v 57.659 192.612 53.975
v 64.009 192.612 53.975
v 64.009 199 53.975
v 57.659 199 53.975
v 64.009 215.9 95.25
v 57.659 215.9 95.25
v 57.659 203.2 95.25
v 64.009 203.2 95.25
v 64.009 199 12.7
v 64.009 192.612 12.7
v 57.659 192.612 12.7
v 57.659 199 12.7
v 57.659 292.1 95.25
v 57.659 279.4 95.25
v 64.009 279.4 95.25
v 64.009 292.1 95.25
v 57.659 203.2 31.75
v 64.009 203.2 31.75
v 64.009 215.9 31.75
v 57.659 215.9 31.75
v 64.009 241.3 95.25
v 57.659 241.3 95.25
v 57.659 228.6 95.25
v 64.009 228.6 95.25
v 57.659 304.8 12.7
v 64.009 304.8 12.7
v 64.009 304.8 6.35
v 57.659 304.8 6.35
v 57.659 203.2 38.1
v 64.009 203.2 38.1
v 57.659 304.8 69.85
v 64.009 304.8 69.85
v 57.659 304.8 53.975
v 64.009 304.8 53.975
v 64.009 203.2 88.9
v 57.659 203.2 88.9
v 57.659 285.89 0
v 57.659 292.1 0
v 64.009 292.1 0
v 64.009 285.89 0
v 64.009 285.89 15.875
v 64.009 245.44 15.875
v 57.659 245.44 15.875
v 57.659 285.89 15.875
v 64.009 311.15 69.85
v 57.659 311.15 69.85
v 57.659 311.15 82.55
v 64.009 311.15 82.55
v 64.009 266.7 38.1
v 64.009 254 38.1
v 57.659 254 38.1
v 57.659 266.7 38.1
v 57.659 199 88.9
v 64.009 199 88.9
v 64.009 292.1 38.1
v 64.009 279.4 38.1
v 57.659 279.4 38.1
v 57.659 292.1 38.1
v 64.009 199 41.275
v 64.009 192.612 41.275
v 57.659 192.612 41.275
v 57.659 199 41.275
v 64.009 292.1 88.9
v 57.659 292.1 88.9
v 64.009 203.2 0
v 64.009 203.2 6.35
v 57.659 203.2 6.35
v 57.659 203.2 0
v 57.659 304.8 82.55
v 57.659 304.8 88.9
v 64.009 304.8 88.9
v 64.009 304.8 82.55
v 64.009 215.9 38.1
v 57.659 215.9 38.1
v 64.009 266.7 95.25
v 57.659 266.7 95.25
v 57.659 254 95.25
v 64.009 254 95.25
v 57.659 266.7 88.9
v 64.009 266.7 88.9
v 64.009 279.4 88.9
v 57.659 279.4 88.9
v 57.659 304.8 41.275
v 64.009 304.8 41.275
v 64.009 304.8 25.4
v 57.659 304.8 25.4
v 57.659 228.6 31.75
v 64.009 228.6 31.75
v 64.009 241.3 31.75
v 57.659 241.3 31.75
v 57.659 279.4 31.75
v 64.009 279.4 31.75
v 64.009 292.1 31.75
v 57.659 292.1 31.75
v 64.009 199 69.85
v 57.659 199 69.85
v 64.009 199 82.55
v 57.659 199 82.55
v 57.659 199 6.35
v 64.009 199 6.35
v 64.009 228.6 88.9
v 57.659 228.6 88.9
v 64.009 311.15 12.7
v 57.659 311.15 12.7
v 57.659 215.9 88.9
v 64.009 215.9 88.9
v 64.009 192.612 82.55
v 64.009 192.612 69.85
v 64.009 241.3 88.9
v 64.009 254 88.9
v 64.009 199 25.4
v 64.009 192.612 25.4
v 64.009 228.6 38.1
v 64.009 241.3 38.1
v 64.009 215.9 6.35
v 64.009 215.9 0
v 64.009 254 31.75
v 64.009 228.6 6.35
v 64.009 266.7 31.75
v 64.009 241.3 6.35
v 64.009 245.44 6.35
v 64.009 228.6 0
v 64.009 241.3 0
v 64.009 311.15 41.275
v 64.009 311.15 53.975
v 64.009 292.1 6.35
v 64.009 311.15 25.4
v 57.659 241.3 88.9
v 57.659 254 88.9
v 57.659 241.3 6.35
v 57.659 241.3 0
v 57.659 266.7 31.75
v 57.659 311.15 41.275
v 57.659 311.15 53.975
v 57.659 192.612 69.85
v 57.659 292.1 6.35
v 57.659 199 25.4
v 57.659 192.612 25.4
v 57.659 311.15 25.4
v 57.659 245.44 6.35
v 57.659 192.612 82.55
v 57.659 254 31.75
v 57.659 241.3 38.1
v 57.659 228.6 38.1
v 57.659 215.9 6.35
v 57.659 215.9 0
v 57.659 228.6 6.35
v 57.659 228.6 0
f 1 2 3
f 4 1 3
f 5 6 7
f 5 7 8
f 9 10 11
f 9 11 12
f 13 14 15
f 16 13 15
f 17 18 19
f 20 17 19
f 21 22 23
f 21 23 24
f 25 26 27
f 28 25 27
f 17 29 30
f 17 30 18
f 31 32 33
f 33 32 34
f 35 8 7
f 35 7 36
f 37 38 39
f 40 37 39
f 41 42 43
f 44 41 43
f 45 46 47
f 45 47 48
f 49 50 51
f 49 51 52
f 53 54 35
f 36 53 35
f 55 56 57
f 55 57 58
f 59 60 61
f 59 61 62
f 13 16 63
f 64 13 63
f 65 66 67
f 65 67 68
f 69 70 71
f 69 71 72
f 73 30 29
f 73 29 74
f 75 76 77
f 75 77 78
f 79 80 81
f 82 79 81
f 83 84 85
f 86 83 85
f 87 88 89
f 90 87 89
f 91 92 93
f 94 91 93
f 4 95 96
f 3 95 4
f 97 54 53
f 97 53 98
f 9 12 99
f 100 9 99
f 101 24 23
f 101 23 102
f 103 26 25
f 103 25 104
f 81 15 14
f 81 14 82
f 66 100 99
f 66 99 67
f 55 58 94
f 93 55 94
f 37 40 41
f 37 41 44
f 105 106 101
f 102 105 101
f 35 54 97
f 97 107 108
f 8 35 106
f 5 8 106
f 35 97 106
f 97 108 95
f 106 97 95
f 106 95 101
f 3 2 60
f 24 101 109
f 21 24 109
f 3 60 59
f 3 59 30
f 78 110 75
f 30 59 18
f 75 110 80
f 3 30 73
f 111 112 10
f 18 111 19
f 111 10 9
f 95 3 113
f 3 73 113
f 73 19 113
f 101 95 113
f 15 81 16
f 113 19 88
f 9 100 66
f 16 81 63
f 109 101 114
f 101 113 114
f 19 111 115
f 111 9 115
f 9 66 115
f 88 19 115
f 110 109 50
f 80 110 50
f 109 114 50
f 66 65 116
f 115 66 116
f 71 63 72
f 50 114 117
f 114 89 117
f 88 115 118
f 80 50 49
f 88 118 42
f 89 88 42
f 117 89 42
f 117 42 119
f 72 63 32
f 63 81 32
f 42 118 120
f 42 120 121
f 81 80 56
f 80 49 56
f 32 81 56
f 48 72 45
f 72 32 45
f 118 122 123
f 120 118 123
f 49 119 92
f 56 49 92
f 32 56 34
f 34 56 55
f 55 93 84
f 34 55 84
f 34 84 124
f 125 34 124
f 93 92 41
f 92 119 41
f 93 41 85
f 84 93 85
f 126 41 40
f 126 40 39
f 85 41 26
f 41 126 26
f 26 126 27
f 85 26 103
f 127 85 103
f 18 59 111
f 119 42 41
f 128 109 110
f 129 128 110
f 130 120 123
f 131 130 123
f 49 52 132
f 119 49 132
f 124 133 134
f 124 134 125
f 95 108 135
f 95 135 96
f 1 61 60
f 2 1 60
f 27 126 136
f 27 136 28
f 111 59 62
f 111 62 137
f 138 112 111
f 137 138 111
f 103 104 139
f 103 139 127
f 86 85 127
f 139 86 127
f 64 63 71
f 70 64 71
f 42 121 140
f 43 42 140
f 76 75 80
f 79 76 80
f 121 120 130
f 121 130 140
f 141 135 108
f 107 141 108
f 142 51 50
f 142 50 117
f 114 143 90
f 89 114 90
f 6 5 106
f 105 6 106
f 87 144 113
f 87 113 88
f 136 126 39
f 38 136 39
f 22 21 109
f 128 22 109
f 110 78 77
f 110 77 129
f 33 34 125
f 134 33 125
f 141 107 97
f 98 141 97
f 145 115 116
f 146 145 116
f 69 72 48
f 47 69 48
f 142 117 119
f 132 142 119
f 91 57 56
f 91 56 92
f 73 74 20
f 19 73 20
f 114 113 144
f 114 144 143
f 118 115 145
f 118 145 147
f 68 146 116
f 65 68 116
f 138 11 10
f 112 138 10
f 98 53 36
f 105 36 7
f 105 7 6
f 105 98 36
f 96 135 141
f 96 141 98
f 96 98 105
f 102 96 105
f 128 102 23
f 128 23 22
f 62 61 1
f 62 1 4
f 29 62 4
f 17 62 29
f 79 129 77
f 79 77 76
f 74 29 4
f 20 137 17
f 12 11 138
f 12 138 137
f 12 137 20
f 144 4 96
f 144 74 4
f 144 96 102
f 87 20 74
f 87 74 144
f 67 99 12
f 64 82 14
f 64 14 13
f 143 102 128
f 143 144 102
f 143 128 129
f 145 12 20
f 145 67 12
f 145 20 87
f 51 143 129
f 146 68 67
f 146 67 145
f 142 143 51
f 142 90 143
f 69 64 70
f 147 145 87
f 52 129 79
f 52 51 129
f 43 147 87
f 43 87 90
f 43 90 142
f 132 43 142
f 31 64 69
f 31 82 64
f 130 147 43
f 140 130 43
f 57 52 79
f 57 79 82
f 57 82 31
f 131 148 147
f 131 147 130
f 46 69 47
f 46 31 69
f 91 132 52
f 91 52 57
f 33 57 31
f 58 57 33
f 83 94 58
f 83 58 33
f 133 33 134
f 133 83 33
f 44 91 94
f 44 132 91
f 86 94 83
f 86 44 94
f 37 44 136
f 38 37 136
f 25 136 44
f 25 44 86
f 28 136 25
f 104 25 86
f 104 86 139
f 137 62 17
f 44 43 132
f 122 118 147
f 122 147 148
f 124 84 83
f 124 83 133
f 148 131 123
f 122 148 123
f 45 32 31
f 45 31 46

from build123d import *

# Parameters (mm, degrees)
SKETCH5_W           = 6.35
SKETCH5_H           = 118.538155393
BOSS_EXTRUDE1_DEPTH = 95.25
SKETCH7_W           = 6.35
SKETCH7_H           = 12.7
CUT_EXTRUDE1_DEPTH  = 7.35
LPATTERN1_COUNT     = 5
LPATTERN1_PITCH     = 25.4
SKETCH8_W           = 6.35
SKETCH8_H           = 12.7
CUT_EXTRUDE2_DEPTH  = 7.35
LPATTERN2_COUNT     = 5
LPATTERN2_PITCH     = 25.4
CUT_EXTRUDE3_DEPTH  = 15.875
SKETCH10_W          = 12.7
SKETCH10_H          = 6.35
SKETCH10_W_2        = 15.875
CUT_EXTRUDE4_DEPTH  = 7.35
SKETCH11_W          = 6.35
SKETCH11_H          = 6.3881
SKETCH11_W_2        = 15.875
CUT_EXTRUDE5_DEPTH  = 7.35
SKETCH13_W          = 6.35
SKETCH13_H          = 2.311210988
SKETCH13_H_2        = 2.900340521
CUT_EXTRUDE6_DEPTH  = 15.875


with BuildPart() as part:
    # Sketch5 → Boss-Extrude1 (new body)
    with BuildSketch(Plane.XY):
        with Locations((60.833541785, 251.880922304)):
            Rectangle(SKETCH5_W, SKETCH5_H)
    extrude(amount=BOSS_EXTRUDE1_DEPTH)

    # Sketch7 → Cut-Extrude1 (cut, through all)
    with BuildSketch(Plane(origin=(64.008541785, 0, 0), x_dir=(0, 0, -1), z_dir=(1, 0, 0))):
        with Locations((-92.075, 298.45)):
            Rectangle(SKETCH7_W, SKETCH7_H)
        with Locations((-3.175, 298.45)):
            Rectangle(SKETCH7_W, SKETCH7_H)
    cut_extrude1 = extrude(amount=-CUT_EXTRUDE1_DEPTH, mode=Mode.SUBTRACT)

    # LPattern1: Cut-Extrude1 ×5
    with Locations(*[(0, -i * LPATTERN1_PITCH, 0) for i in range(1, LPATTERN1_COUNT)]):
        add(cut_extrude1, mode=Mode.SUBTRACT)

    # Sketch8 → Cut-Extrude2 (cut, through all)
    with BuildSketch(Plane(origin=(64.008541785, 0, 0), x_dir=(0, 0, -1), z_dir=(1, 0, 0))):
        with Locations((-34.925, 311.15)):
            Rectangle(SKETCH8_W, SKETCH8_H)
    cut_extrude2 = extrude(amount=-CUT_EXTRUDE2_DEPTH, mode=Mode.SUBTRACT)

    # LPattern2: Cut-Extrude2 ×5
    with Locations(*[(0, -i * LPATTERN2_PITCH, 0) for i in range(1, LPATTERN2_COUNT)]):
        add(cut_extrude2, mode=Mode.SUBTRACT)

    # Sketch9 → Cut-Extrude3 (cut)
    with BuildSketch(Plane(origin=(0, 0, 0), x_dir=(-1, 0, 0), z_dir=(0, 0, -1))):
        with BuildLine():
            Line((-42.140789022, 277.931008412), (-81.069773467, 292.1))
            Line((-81.069773467, 292.1), (-81.069773467, 237.646932857))
            Line((-81.069773467, 237.646932857), (-41.263032712, 255.828523916))
            ThreePointArc((-41.263032712, 255.828523916), (-34.286165861, 267.174267761), (-42.140789022, 277.931008412))
        make_face()
    extrude(amount=-CUT_EXTRUDE3_DEPTH, mode=Mode.SUBTRACT)

    # Sketch10 → Cut-Extrude4 (cut, through all)
    with BuildSketch(Plane(origin=(64.008541785, 0, 0), x_dir=(0, 0, -1), z_dir=(1, 0, 0))):
        with Locations((-88.9, 307.975)):
            Rectangle(SKETCH10_W, SKETCH10_H)
        with Locations((-61.9125, 307.975)):
            Rectangle(SKETCH10_W_2, SKETCH10_H)
        with Locations((-33.3375, 307.975)):
            Rectangle(SKETCH10_W_2, SKETCH10_H)
        with Locations((-6.35, 307.975)):
            Rectangle(SKETCH10_W, SKETCH10_H)
    extrude(amount=-CUT_EXTRUDE4_DEPTH, mode=Mode.SUBTRACT)

    # Sketch11 → Cut-Extrude5 (cut, through all)
    with BuildSketch(Plane(origin=(64.008541785, 0, 0), x_dir=(0, 0, -1), z_dir=(1, 0, 0))):
        with Locations((-85.725, 195.805894607)):
            Rectangle(SKETCH11_W, SKETCH11_H)
        with Locations((-61.9125, 195.805894607)):
            Rectangle(SKETCH11_W_2, SKETCH11_H)
        with Locations((-33.3375, 195.805894607)):
            Rectangle(SKETCH11_W_2, SKETCH11_H)
        with Locations((-9.525, 195.805894607)):
            Rectangle(SKETCH11_W, SKETCH11_H)
    extrude(amount=-CUT_EXTRUDE5_DEPTH, mode=Mode.SUBTRACT)

    # Sketch13 → Cut-Extrude6 (cut)
    with BuildSketch(Plane(origin=(0, 0, 0), x_dir=(-1, 0, 0), z_dir=(0, 0, -1))):
        with Locations((-60.833541785, 284.734614014)):
            Rectangle(SKETCH13_W, SKETCH13_H)
        with Locations((-60.833541785, 246.889761636)):
            Rectangle(SKETCH13_W, SKETCH13_H_2)
    extrude(amount=-CUT_EXTRUDE6_DEPTH, mode=Mode.SUBTRACT)


solid = part.part
